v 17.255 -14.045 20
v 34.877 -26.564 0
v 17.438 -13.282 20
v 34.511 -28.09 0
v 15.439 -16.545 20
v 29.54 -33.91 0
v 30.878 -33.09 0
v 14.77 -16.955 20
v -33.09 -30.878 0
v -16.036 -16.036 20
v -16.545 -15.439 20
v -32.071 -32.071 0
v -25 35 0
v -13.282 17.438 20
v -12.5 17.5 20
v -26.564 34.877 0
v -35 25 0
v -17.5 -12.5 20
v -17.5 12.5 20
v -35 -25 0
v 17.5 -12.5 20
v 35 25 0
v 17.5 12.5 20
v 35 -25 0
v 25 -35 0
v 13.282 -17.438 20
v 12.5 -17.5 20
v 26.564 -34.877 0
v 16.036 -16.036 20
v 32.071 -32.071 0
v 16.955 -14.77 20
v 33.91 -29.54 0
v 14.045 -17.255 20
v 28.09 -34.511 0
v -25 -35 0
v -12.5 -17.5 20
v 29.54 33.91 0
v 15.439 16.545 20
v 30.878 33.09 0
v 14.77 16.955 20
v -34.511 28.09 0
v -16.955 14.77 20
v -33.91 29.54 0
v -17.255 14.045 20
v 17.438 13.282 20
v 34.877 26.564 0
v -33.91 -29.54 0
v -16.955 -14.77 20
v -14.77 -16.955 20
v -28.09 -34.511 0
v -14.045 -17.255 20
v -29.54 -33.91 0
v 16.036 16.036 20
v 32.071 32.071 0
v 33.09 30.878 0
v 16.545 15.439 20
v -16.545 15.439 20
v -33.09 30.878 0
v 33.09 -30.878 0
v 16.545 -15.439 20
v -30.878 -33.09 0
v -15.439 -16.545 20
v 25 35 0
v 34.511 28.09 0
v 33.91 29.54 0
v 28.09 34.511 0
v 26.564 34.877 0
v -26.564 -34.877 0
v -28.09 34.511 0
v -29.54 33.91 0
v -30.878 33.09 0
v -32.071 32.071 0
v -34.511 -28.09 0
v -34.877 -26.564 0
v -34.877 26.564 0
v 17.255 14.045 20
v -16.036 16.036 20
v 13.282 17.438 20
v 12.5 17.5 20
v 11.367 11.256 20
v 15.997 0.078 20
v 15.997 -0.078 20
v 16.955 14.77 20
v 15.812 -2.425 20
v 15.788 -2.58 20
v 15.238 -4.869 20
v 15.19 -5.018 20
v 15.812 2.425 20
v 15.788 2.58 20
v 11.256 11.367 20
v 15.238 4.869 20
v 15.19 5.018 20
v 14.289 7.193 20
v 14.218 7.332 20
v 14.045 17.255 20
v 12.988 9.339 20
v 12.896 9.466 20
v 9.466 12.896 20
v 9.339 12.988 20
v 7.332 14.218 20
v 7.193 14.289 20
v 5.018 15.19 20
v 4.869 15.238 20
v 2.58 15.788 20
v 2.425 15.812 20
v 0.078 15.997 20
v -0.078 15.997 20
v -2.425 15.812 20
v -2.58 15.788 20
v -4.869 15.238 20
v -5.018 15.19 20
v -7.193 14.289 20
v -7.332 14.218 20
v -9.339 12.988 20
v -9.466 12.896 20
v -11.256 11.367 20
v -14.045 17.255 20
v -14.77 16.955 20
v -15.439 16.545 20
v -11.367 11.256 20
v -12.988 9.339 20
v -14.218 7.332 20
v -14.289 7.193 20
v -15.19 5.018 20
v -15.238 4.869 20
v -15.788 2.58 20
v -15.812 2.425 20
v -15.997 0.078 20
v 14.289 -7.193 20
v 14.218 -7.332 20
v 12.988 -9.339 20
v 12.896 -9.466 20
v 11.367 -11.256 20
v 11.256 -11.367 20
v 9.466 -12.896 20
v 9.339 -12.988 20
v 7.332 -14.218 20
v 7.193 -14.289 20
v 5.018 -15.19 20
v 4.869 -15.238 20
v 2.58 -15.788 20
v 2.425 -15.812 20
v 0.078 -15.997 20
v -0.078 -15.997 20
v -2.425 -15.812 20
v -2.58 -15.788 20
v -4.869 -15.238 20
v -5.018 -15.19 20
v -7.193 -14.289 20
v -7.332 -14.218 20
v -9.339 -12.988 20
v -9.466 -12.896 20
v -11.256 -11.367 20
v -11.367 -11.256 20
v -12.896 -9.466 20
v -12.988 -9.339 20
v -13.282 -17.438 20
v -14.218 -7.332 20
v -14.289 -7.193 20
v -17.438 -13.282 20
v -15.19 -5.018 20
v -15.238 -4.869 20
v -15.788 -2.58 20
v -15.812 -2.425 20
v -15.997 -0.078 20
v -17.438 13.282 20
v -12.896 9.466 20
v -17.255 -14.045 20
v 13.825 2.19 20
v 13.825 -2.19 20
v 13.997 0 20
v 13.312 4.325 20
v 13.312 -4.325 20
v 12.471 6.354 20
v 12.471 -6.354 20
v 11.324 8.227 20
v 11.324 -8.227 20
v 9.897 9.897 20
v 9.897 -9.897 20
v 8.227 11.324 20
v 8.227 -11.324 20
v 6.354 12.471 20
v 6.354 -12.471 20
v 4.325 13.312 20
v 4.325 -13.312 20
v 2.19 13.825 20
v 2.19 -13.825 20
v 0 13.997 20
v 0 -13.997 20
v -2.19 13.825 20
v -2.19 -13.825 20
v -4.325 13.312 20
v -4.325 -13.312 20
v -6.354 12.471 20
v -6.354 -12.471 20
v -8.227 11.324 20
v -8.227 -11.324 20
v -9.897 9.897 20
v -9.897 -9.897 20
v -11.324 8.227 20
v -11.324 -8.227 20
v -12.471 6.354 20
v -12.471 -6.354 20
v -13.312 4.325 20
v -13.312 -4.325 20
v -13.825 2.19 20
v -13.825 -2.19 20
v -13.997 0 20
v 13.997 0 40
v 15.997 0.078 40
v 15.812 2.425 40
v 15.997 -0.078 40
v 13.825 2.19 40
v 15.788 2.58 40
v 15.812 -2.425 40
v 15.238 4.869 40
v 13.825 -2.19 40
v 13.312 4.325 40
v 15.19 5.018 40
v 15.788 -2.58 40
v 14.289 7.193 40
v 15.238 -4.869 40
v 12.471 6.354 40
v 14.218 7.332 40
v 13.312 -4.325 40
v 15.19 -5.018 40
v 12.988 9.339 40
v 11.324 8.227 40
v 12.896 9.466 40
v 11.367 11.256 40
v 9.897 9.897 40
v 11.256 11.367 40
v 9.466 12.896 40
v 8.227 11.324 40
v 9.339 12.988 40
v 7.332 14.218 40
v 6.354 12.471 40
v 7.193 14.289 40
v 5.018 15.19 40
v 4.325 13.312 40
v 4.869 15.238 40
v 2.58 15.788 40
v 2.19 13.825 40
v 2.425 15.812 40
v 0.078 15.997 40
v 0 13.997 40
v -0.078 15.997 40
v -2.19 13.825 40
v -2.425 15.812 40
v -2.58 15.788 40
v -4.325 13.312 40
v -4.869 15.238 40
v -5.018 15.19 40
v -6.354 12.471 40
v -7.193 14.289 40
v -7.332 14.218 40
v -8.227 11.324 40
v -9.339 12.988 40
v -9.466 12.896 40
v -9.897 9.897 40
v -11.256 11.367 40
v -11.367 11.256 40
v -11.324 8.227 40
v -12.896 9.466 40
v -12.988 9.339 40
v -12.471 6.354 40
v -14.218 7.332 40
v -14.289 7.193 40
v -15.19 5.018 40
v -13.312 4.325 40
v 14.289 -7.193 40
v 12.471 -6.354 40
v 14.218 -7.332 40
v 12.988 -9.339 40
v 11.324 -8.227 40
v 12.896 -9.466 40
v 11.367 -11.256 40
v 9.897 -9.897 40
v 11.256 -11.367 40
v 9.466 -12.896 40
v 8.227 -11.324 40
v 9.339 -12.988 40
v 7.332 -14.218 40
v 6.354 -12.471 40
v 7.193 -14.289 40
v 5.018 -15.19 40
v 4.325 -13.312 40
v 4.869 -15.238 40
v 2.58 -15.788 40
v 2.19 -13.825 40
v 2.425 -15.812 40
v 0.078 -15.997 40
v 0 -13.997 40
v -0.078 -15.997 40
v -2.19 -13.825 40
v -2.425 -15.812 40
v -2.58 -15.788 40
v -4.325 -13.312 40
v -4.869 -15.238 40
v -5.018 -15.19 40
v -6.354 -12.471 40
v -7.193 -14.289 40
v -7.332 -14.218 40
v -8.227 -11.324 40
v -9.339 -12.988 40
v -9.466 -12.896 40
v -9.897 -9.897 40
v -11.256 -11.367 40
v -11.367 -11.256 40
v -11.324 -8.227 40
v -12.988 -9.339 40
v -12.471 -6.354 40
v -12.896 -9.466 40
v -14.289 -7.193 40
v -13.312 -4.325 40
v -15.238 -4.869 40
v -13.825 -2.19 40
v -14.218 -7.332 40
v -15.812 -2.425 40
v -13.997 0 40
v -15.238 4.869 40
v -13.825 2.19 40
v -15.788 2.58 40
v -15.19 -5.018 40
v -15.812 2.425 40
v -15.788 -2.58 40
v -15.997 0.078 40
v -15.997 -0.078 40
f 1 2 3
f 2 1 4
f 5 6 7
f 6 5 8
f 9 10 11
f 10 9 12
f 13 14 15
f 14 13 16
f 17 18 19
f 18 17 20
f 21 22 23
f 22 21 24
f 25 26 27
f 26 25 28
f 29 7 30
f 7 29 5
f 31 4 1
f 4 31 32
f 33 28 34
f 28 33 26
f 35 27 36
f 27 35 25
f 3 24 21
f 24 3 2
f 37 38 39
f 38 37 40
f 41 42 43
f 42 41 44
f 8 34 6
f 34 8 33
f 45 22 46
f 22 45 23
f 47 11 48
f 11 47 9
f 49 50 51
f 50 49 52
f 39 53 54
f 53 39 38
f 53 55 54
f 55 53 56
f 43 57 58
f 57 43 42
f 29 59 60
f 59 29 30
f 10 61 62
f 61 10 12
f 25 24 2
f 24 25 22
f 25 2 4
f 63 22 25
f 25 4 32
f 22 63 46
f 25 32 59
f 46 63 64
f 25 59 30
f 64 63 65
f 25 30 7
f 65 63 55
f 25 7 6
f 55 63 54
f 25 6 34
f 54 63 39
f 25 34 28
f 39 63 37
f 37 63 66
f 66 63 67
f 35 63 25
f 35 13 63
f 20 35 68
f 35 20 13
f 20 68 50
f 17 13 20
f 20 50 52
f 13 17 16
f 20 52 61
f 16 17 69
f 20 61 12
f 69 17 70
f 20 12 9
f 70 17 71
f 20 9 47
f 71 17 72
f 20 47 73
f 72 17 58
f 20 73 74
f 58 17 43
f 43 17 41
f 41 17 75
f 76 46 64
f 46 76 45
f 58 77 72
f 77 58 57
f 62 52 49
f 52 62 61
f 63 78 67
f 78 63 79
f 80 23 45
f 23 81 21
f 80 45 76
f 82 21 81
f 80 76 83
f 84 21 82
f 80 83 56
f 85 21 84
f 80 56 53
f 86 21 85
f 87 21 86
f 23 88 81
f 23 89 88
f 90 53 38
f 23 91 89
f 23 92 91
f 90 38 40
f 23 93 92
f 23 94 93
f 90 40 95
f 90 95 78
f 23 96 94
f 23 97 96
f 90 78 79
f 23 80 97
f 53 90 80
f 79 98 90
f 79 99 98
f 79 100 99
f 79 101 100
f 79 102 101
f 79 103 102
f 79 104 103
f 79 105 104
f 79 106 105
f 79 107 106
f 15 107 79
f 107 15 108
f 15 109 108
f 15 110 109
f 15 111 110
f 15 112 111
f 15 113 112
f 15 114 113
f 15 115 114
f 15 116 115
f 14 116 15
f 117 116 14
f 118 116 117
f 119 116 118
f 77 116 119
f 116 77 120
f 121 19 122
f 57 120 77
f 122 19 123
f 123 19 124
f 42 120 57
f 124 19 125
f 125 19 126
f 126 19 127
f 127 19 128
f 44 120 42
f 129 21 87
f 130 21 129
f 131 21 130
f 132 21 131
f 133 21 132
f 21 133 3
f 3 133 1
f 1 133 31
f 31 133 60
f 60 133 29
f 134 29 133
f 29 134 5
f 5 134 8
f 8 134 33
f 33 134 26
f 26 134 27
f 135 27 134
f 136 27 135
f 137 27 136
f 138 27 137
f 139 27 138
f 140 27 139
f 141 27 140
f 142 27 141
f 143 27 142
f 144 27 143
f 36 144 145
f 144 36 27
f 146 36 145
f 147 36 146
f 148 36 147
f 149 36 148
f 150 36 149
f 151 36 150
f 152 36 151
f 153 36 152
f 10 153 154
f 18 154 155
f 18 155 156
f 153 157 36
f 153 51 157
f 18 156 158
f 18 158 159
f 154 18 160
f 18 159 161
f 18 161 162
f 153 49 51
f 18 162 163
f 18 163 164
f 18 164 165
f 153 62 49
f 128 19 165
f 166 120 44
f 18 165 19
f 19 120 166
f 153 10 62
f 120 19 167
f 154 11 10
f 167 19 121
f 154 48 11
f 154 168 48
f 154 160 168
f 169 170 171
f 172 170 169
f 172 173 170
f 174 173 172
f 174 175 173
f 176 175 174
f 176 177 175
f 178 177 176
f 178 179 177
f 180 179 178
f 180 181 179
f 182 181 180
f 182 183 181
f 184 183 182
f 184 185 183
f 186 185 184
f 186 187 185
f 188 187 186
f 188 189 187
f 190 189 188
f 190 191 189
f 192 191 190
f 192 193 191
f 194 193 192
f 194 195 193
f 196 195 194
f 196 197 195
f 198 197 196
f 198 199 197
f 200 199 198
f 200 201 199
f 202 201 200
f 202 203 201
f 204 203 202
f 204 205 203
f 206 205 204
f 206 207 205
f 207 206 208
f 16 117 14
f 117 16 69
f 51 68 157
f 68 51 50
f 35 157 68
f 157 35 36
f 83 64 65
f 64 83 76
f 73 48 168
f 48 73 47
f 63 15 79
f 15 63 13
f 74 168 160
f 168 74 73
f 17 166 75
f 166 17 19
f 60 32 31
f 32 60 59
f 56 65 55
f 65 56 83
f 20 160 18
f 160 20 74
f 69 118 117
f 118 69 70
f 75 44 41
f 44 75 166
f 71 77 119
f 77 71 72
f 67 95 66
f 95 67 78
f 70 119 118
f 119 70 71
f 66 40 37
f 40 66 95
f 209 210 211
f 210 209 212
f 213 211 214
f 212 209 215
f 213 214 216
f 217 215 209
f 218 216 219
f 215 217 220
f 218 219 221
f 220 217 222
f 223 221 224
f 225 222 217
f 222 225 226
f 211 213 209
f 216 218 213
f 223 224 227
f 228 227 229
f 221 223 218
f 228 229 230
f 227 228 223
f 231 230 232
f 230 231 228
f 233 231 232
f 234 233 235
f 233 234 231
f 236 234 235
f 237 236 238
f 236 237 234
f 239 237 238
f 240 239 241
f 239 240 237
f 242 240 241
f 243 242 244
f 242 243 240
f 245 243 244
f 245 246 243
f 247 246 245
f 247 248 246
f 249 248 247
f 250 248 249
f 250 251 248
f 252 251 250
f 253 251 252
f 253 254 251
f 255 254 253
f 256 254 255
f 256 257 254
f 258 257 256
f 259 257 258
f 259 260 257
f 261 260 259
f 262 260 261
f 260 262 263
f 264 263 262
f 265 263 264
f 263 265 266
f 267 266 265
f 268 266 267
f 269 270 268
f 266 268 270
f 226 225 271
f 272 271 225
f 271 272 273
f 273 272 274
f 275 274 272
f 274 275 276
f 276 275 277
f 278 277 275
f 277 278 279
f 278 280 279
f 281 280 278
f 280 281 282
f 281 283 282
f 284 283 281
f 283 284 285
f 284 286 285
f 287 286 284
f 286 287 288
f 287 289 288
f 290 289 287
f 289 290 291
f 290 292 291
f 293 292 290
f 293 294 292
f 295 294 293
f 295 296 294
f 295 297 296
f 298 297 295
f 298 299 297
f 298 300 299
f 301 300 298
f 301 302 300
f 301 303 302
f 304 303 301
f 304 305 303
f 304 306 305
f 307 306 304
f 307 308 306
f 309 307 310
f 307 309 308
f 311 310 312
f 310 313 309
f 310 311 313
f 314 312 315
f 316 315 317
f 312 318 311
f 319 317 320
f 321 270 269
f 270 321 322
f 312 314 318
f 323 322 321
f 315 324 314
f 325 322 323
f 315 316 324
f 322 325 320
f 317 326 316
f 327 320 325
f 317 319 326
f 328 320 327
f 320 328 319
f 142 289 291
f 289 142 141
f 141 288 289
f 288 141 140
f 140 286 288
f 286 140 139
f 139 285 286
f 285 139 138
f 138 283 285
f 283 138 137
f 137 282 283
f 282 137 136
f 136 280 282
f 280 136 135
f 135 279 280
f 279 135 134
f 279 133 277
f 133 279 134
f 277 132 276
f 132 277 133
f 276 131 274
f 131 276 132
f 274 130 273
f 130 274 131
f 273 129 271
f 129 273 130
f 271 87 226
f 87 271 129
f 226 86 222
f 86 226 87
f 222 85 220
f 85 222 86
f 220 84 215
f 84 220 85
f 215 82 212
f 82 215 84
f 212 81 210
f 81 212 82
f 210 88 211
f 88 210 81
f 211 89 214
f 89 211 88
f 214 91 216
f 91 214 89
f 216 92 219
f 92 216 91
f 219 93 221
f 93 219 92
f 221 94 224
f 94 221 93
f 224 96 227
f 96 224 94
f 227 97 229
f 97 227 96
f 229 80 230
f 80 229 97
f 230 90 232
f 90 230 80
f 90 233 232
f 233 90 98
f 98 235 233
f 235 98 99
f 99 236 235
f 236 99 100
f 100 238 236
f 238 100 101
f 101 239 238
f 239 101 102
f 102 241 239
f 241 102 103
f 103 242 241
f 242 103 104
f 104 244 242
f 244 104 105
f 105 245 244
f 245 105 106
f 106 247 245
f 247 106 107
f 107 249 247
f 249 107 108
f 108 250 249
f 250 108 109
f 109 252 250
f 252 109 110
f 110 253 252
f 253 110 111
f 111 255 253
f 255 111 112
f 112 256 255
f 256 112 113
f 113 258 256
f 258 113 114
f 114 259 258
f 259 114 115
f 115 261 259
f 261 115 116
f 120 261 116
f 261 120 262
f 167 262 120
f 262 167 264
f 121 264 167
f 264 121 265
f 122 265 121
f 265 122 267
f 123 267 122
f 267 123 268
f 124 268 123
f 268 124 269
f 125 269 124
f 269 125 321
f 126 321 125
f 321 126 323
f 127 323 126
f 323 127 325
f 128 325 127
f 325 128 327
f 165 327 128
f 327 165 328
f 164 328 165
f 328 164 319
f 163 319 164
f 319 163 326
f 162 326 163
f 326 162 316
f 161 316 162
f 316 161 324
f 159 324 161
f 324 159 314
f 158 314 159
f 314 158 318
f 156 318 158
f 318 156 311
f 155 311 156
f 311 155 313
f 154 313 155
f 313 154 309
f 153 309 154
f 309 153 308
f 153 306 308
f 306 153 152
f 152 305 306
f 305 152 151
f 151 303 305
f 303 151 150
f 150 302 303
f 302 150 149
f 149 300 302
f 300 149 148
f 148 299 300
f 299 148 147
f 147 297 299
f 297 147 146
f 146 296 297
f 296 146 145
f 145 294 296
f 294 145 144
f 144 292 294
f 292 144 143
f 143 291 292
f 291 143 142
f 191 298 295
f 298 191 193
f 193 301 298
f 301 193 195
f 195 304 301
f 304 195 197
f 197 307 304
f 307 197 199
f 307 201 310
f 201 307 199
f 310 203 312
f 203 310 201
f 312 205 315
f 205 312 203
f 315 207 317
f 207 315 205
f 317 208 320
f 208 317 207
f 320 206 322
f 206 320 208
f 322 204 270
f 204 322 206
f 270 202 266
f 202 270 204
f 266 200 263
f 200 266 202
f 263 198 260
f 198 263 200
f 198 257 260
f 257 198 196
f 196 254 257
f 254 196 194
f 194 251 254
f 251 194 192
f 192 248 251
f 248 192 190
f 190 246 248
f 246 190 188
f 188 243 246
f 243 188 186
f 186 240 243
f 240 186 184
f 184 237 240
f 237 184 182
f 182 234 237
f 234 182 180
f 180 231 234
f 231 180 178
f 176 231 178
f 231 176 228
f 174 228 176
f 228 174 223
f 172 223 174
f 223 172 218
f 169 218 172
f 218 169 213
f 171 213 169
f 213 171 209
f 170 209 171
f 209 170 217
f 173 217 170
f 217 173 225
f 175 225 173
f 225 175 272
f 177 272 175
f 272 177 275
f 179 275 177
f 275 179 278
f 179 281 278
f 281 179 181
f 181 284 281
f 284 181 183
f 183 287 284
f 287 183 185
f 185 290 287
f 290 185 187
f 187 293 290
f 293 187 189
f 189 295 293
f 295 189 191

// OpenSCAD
// offset.scad - Example for offset() usage in OpenSCAD

$fn = 40;

foot_height = 20;

echo(version = version());

module outline(wall = 1) {
    difference() {
        offset(wall / 2) children();
        offset(-wall / 2) children();
    }
}

// offsetting with a positive value allows to create rounded corners easily
linear_extrude(height = foot_height, scale = 0.5) {
    offset(10) {
        square(50, center = true);
    }
}

translate([0, 0, foot_height]) {
    linear_extrude(height = 20) {
        outline(wall = 2) circle(15);
    }
}

%cylinder(r = 14, h = 100);
%translate([0, 0, 100]) sphere(r = 30);

// Written in 2014 by Torsten Paul <Torsten.Paul@gmx.de>
//
// To the extent possible under law, the author(s) have dedicated all
// copyright and related and neighboring rights to this software to the
// public domain worldwide. This software is distributed without any
// warranty.
//
// You should have received a copy of the CC0 Public Domain
// Dedication along with this software.
// If not, see <http://creativecommons.org/publicdomain/zero/1.0/>.
